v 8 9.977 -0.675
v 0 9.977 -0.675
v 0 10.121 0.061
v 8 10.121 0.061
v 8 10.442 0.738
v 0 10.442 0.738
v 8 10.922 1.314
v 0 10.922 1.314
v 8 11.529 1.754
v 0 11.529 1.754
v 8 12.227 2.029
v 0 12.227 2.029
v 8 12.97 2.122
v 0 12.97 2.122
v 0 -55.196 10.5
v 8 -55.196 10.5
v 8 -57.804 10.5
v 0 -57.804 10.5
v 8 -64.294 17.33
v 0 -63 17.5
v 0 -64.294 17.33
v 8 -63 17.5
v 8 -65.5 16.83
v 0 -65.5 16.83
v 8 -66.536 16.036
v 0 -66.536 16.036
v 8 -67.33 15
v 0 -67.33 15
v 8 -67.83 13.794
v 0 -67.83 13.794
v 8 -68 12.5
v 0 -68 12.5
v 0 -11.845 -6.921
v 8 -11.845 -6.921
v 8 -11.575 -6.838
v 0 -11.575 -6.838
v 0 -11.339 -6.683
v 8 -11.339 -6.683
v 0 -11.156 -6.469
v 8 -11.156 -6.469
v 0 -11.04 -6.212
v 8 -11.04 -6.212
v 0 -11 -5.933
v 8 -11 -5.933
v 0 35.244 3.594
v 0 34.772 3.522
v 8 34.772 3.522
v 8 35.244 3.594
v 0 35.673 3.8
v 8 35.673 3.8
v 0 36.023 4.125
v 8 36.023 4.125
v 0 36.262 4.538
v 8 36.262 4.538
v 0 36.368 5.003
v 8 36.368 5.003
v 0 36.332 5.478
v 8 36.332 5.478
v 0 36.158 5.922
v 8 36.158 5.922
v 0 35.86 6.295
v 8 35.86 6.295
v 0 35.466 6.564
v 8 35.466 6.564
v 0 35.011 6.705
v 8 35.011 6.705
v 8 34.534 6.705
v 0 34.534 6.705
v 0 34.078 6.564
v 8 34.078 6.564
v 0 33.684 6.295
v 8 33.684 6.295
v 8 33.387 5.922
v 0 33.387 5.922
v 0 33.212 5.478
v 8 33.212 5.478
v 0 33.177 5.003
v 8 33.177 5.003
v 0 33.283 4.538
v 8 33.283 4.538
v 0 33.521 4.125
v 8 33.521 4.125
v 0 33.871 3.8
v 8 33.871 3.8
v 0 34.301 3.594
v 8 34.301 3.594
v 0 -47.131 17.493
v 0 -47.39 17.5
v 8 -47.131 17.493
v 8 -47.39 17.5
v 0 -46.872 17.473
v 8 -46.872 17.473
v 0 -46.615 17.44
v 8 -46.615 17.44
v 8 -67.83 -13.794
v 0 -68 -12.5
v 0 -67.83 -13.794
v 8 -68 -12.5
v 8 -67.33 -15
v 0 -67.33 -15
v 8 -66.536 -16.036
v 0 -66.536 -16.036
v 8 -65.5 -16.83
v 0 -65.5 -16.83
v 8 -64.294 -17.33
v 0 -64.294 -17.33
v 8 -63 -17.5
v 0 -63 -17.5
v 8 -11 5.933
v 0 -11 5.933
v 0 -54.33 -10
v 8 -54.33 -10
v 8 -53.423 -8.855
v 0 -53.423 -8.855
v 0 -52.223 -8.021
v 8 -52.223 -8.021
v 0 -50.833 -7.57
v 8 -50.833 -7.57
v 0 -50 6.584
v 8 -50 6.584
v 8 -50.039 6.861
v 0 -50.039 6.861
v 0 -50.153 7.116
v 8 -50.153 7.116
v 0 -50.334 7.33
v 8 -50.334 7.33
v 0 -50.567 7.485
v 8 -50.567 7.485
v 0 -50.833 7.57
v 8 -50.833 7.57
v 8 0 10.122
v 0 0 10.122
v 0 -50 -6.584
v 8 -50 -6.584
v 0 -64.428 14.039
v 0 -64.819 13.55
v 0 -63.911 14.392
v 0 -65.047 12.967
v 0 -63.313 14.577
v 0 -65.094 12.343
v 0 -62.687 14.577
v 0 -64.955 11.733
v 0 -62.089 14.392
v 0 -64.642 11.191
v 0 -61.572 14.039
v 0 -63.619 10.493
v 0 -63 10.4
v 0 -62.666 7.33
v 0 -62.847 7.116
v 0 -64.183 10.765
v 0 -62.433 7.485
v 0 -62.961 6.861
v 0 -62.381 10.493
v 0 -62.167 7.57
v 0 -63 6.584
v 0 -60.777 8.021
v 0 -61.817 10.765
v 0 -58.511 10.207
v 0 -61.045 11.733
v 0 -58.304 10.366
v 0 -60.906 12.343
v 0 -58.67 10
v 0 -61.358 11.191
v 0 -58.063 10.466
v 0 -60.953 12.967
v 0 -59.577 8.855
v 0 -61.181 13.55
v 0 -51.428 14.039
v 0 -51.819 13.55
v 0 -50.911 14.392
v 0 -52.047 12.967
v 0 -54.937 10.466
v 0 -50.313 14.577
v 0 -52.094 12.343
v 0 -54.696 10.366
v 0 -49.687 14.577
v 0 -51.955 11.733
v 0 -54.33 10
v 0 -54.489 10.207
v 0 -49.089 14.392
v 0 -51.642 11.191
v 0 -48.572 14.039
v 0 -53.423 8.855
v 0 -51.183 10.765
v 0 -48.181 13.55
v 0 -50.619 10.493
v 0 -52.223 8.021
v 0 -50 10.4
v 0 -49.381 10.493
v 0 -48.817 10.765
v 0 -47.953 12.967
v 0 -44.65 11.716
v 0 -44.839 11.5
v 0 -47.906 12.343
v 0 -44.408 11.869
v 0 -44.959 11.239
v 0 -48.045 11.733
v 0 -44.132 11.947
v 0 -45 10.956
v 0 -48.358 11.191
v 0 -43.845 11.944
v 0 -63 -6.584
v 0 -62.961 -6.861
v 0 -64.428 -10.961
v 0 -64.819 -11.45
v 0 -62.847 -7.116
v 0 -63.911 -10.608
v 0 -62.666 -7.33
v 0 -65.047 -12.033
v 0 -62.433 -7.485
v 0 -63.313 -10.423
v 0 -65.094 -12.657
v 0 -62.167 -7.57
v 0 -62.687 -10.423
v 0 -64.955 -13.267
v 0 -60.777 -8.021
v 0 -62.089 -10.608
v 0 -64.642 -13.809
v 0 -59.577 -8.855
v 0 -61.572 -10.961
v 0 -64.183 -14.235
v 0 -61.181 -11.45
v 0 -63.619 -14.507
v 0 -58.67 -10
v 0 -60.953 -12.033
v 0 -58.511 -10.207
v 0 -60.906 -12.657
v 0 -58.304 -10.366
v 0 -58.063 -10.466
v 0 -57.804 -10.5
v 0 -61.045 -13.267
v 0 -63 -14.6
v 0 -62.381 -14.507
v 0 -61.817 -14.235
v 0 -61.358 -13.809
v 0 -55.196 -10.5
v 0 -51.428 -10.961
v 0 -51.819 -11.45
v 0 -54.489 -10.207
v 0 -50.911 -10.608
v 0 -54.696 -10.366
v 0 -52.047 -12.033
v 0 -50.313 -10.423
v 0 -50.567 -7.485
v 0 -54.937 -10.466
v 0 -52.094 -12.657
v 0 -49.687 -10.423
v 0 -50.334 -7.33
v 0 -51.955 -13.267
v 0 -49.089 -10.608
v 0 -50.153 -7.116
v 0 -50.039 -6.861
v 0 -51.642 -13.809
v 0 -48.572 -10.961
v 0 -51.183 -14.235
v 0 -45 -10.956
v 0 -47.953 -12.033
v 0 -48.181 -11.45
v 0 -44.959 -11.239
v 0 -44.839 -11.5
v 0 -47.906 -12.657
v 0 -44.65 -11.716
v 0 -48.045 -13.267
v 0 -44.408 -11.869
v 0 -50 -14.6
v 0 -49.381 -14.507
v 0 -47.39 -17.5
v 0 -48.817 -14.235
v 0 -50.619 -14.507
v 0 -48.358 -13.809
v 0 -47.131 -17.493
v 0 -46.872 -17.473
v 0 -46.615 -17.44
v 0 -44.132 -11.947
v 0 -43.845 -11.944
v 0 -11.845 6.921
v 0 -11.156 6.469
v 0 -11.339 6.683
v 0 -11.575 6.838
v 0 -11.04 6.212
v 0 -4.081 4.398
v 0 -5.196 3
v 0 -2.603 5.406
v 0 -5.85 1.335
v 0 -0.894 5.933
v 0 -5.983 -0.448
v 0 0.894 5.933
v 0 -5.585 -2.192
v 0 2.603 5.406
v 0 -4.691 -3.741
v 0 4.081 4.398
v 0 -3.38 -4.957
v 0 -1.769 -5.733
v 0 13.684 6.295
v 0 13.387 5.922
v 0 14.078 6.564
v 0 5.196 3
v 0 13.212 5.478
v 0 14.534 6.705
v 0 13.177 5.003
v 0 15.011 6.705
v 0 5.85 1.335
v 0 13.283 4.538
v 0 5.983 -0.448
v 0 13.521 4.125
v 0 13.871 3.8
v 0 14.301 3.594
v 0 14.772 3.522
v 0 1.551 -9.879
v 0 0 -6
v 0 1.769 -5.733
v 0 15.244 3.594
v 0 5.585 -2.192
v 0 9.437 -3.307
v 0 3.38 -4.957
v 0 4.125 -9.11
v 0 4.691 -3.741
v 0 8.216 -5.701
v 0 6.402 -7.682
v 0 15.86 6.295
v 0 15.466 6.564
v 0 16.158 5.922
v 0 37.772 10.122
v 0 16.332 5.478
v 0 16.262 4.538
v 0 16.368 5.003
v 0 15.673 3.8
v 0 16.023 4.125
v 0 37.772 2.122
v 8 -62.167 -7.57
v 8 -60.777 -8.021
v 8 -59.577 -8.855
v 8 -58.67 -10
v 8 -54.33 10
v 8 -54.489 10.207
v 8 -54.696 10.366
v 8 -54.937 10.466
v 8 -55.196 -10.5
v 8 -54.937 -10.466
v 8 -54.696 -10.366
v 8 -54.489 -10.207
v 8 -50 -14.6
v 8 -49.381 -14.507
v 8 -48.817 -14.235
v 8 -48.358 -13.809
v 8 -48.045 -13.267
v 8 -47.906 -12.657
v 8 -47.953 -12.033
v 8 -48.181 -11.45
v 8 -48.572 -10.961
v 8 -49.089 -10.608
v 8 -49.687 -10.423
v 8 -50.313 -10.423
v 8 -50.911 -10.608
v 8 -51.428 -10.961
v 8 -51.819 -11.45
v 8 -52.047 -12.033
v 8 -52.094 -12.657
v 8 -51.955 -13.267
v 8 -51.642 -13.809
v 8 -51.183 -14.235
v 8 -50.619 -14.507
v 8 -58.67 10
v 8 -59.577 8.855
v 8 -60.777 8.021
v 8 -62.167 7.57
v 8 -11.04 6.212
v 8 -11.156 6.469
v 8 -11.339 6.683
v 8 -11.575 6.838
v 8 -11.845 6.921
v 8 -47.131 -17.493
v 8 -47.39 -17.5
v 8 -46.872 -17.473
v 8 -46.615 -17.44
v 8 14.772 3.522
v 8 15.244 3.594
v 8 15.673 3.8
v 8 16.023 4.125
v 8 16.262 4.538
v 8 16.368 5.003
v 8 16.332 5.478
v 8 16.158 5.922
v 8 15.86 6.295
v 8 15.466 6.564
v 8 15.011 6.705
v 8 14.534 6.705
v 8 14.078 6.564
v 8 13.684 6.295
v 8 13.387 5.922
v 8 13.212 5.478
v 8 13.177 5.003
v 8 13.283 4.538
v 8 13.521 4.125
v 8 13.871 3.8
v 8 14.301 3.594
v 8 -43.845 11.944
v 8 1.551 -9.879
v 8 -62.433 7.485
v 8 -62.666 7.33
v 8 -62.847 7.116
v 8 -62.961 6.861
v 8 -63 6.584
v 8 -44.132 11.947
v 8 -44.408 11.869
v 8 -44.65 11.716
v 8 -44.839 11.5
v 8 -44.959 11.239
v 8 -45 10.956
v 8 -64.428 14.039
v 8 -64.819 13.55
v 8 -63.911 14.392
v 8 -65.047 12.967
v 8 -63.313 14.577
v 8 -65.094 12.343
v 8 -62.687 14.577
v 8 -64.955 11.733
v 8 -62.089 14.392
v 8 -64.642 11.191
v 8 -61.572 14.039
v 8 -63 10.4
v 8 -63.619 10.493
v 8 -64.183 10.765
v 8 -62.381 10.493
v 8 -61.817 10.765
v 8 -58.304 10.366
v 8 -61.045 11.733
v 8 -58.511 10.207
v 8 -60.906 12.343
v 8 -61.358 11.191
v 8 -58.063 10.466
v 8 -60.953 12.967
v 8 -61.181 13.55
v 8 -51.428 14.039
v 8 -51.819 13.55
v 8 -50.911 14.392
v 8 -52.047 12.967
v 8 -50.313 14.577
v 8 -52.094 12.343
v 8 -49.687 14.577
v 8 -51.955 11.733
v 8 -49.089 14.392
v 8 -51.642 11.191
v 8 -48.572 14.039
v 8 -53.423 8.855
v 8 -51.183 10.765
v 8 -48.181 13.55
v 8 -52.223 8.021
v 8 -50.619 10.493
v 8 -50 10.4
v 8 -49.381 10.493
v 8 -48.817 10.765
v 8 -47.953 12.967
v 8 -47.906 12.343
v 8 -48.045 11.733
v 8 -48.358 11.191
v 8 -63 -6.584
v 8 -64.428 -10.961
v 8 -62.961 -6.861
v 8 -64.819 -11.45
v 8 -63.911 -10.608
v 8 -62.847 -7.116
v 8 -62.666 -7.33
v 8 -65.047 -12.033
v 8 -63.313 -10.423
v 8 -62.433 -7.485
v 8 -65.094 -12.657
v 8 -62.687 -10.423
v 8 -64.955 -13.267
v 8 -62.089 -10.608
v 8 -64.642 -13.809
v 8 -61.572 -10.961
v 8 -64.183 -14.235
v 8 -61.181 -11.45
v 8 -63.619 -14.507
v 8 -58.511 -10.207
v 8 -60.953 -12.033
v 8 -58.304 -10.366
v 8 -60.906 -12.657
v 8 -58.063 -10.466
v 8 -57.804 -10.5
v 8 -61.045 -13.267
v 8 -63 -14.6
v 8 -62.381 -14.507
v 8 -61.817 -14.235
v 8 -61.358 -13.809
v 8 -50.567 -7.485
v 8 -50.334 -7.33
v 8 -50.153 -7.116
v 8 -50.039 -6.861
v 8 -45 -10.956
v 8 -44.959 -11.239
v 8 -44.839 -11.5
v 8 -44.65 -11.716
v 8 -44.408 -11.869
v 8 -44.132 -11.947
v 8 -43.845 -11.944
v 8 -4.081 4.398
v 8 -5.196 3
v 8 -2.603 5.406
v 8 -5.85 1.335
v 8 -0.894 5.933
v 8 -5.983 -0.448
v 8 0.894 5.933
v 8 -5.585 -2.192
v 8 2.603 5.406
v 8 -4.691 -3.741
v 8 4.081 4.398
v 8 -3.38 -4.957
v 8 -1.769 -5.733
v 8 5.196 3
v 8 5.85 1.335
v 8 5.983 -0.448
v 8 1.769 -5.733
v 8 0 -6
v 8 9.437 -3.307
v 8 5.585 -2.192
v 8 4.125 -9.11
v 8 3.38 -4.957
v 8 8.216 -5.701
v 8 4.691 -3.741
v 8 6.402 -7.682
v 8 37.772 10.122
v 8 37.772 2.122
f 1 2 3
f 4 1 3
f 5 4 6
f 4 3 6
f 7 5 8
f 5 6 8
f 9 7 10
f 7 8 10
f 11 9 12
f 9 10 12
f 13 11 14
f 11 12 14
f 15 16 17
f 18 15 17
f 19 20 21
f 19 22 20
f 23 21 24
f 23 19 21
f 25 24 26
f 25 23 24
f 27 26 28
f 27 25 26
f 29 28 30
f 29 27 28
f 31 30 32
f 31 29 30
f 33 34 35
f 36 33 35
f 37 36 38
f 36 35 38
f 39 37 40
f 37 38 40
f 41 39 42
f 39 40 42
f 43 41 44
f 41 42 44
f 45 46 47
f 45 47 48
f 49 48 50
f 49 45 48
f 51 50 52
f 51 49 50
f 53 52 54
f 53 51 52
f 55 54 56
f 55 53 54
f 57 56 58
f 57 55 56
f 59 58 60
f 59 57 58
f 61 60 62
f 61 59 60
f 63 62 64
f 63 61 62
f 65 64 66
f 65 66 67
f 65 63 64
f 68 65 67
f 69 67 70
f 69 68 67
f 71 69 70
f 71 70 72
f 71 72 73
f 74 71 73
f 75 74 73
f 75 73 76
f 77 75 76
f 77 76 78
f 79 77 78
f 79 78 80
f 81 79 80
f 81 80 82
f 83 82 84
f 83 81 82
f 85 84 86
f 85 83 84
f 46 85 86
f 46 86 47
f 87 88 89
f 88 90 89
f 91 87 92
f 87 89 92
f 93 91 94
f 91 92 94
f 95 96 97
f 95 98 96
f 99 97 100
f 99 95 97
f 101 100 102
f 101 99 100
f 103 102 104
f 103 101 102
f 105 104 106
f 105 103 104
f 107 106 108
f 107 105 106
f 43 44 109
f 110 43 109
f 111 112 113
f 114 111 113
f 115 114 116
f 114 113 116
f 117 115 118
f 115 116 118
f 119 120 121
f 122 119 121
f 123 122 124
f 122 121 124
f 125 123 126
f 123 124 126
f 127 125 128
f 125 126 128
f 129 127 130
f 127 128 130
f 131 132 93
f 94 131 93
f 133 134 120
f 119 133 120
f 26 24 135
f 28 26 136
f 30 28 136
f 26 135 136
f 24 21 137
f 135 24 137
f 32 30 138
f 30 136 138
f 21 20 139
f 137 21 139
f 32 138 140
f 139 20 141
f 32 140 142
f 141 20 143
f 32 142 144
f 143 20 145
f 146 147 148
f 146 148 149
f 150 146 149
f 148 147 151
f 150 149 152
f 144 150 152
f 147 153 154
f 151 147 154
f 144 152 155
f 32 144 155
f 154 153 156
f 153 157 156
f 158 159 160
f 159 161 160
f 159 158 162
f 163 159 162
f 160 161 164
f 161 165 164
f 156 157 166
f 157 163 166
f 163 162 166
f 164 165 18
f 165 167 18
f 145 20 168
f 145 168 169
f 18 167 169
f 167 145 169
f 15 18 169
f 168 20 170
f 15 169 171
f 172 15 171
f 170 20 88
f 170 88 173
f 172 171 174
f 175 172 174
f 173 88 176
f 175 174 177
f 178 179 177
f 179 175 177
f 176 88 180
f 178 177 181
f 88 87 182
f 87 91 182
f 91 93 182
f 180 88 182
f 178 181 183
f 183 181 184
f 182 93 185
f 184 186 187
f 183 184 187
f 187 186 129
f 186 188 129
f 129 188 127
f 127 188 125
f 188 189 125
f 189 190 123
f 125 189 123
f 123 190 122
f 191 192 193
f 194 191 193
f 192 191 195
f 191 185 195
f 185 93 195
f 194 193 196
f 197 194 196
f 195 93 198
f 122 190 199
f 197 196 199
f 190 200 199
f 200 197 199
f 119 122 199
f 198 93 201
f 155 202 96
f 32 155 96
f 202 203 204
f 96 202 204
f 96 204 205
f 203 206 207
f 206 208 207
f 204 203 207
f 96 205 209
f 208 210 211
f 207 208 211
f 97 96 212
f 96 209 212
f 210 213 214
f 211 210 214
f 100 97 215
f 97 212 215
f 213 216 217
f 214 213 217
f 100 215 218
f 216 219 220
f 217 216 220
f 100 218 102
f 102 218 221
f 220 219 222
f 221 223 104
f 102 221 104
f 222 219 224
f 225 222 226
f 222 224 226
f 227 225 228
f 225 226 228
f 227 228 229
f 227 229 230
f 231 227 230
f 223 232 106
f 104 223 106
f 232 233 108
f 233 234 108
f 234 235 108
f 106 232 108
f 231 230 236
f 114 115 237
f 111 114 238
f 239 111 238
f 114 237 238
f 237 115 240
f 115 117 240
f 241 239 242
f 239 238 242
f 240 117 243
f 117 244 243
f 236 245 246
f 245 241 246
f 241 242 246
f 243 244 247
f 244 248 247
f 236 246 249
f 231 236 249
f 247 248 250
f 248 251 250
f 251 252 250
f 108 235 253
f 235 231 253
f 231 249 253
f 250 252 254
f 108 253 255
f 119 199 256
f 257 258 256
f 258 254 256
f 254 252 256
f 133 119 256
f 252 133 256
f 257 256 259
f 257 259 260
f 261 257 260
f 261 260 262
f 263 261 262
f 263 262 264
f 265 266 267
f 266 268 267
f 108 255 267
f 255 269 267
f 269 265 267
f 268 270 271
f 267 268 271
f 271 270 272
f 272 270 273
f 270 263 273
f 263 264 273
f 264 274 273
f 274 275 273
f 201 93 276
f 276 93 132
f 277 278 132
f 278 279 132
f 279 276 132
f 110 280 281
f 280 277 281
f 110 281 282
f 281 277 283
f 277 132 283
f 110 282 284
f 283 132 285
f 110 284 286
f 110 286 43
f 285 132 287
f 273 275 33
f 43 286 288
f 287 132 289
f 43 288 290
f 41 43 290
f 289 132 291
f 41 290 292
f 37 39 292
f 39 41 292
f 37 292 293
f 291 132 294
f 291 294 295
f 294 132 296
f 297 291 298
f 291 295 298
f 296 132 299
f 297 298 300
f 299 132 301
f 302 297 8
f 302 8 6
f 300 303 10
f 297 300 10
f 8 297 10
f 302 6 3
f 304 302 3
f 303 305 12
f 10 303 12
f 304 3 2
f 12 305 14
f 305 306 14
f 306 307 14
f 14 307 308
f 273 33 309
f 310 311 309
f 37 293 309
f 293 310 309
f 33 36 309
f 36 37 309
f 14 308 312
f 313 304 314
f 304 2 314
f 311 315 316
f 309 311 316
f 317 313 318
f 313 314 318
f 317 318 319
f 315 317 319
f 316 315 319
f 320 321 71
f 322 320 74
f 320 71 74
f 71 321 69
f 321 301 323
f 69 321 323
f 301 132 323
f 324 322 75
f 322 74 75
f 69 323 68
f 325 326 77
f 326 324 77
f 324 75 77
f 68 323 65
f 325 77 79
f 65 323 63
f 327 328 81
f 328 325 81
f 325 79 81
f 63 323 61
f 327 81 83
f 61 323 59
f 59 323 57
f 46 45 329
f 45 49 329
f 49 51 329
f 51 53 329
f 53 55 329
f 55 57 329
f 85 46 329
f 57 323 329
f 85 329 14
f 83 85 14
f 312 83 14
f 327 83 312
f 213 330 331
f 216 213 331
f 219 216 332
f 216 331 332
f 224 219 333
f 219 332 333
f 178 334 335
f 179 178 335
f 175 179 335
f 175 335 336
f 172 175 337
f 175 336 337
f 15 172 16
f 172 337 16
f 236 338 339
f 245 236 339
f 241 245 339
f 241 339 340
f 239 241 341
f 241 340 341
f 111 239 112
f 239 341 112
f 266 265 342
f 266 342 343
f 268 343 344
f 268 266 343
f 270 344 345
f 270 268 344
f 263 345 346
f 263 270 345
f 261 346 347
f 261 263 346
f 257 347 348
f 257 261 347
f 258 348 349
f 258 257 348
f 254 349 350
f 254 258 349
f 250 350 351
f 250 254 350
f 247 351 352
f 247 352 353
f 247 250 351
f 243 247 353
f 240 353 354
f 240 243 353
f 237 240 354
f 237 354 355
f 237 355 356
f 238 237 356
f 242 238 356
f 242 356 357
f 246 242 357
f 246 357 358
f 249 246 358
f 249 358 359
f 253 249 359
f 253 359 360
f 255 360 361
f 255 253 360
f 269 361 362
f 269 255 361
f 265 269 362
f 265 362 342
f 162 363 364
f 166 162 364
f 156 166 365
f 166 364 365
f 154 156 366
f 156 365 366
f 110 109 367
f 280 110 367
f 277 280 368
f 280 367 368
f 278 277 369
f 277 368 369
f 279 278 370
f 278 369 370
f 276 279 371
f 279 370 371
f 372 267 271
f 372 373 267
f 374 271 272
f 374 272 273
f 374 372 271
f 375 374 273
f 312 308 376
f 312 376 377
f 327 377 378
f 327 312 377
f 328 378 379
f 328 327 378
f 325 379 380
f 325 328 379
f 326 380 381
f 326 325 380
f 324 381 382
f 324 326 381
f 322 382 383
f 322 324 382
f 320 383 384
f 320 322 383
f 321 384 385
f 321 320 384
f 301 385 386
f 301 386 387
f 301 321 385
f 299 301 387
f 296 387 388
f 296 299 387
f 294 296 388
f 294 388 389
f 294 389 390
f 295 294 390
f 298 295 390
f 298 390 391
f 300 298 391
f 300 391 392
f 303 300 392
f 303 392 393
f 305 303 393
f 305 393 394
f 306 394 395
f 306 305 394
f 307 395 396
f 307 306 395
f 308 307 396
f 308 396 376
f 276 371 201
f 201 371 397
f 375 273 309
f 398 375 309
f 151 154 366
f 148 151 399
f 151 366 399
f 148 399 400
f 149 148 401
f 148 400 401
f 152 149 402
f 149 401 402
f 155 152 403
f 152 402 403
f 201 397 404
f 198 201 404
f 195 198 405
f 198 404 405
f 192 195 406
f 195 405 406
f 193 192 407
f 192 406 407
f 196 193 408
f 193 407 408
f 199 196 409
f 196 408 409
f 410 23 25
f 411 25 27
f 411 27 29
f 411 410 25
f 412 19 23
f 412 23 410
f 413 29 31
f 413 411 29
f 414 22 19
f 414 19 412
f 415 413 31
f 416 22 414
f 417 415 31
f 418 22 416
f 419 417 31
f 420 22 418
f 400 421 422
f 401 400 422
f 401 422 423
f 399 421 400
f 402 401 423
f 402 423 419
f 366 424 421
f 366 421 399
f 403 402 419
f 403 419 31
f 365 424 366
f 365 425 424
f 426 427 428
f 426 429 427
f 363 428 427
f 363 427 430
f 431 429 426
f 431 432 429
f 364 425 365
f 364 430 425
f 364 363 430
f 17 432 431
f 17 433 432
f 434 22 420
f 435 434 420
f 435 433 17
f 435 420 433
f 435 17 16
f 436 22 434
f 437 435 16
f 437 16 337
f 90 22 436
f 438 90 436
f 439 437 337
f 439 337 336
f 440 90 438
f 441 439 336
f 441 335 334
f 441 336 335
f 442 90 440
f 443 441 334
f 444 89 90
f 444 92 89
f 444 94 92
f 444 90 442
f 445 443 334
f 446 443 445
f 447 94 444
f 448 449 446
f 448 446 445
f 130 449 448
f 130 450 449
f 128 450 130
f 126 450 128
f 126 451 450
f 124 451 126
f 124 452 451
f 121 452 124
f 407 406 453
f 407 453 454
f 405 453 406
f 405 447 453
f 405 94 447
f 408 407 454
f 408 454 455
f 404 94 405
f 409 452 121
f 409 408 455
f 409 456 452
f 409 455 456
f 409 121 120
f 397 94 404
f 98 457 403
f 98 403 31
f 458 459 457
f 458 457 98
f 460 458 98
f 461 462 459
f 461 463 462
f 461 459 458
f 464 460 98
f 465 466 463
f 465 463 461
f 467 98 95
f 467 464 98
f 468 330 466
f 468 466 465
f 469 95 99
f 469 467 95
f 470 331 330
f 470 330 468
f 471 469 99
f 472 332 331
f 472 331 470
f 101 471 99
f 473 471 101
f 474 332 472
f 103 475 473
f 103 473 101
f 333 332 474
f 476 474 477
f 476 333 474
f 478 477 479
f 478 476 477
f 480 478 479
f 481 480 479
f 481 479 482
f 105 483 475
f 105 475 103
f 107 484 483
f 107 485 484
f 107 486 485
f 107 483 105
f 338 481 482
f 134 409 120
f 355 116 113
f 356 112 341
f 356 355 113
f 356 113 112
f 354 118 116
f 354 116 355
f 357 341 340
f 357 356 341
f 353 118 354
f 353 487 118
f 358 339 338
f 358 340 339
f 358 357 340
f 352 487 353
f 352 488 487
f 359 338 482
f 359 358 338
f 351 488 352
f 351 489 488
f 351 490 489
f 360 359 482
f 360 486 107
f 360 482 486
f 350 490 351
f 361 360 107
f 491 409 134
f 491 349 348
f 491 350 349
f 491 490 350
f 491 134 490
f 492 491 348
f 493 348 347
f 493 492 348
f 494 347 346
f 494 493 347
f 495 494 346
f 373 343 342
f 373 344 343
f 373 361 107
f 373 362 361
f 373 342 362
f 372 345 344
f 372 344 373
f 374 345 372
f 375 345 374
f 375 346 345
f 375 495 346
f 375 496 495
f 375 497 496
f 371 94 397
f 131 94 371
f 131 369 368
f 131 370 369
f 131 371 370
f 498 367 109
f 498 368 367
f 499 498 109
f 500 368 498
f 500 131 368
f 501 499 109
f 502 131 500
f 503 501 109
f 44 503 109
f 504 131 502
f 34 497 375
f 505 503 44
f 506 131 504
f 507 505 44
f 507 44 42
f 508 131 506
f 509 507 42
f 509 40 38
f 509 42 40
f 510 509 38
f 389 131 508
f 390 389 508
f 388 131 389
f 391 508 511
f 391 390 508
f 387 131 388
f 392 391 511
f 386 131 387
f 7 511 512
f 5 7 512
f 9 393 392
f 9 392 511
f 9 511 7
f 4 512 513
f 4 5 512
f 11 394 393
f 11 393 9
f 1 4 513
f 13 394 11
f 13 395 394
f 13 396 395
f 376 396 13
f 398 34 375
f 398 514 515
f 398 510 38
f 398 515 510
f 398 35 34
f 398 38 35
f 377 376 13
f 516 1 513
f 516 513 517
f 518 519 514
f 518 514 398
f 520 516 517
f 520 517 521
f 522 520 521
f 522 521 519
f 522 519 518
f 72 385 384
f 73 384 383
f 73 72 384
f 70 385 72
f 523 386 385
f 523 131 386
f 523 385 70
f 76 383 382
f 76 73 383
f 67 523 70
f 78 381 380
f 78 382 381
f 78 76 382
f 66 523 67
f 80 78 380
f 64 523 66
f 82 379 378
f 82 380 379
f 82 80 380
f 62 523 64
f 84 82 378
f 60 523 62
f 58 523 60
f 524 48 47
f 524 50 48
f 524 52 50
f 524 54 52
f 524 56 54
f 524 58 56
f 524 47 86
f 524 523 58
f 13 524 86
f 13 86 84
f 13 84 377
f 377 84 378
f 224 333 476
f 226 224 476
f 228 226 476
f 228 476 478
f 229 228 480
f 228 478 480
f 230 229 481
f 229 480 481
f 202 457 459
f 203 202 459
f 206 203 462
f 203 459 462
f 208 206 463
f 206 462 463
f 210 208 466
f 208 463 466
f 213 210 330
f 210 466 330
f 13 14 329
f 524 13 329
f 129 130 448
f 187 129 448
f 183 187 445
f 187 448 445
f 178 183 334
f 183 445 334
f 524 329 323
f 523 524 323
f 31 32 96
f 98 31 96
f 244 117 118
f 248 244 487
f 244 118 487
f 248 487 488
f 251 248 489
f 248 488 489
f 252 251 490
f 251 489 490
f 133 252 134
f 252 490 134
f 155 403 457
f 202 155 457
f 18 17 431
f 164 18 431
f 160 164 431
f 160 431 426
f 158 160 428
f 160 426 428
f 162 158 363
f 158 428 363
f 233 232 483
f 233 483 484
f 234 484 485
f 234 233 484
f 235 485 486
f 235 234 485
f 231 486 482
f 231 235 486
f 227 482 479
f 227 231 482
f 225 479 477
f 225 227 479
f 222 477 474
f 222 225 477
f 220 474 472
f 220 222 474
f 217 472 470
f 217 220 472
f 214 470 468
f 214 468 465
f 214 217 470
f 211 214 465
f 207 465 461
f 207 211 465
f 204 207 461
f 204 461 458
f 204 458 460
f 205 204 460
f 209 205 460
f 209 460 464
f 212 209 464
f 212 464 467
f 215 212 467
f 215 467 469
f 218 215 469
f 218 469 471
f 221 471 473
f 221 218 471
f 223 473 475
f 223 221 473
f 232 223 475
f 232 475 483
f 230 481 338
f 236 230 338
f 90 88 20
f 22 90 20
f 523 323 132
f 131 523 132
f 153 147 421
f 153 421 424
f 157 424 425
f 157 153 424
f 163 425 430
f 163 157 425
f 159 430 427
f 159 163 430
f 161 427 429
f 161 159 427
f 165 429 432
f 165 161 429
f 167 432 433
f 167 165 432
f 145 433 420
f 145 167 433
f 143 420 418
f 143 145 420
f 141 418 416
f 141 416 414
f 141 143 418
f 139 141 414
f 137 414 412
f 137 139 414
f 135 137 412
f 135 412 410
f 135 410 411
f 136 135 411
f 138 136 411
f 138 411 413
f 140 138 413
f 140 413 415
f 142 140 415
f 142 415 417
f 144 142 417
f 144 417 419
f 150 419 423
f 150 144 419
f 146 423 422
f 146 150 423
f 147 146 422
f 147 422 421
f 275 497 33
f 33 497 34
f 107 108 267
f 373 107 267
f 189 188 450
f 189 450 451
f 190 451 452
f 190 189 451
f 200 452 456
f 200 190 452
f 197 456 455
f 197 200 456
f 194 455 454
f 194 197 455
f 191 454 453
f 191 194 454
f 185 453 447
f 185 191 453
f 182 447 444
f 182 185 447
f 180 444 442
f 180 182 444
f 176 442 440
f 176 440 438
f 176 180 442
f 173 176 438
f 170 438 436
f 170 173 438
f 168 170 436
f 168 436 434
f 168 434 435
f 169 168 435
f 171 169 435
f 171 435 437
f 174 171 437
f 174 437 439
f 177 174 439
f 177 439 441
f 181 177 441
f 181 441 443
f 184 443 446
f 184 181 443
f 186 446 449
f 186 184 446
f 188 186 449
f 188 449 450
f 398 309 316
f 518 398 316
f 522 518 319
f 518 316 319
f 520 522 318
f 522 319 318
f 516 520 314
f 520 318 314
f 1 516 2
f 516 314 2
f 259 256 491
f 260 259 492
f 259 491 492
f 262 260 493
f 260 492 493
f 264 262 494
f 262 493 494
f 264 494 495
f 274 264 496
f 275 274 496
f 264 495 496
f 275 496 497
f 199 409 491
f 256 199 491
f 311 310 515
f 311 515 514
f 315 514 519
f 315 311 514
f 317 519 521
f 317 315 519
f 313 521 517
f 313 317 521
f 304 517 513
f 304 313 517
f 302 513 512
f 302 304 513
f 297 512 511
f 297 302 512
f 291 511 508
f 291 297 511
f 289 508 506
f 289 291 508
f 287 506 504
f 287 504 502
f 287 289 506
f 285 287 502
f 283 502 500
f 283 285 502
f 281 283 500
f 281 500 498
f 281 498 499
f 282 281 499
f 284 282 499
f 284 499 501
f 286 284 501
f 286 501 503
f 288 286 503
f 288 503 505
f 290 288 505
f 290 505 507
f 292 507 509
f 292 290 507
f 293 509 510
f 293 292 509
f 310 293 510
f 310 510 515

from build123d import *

# Parameters (mm, degrees)
SKETCH_1_R          = 6
SKETCH_1_R_2        = 2.1
SKETCH_1_R_3        = 1.6
EXTRUDE_1_DEPTH     = 8
CUT_EXTRUDE_2_DEPTH = 71.670007783
FILLET_1_R          = 5


with BuildPart() as part:
    # 草图1 → 凸台-拉伸1 (new body)
    with BuildSketch(Plane(origin=(0, 0, 0), x_dir=(0, 0, -1), z_dir=(1, 0, 0))):
        with BuildLine():
            Line((-17.5, -47), (-17.5, -68))
            Line((-17.5, -68), (17.5, -68))
            Line((17.5, -68), (17.5, -47))
            Line((17.5, -47), (9.879034185, 1.550704218))
            ThreePointArc((9.879034185, 1.550704218), (6.75266911, 7.375734533), (0.675040765, 9.977189983))
            ThreePointArc((0.675040765, 9.977189983), (-1.314197069, 10.921876413), (-2.122447005, 12.970346978))
            Line((-2.122447005, 12.970346978), (-2.122447005, 37.772165508))
            Line((-2.122447005, 37.772165508), (-10.122447005, 37.772165508))
            Line((-10.122447005, 37.772165508), (-10.122447005, 0))
            Line((-10.122447005, 0), (-17.5, -47))
        make_face()
        Circle(SKETCH_1_R, mode=Mode.SUBTRACT)
        with Locations((-12.5, -50)):
            Circle(SKETCH_1_R_2, mode=Mode.SUBTRACT)
        with Locations((12.5, -50)):
            Circle(SKETCH_1_R_2, mode=Mode.SUBTRACT)
        with Locations((-12.5, -63)):
            Circle(SKETCH_1_R_2, mode=Mode.SUBTRACT)
        with Locations((12.5, -63)):
            Circle(SKETCH_1_R_2, mode=Mode.SUBTRACT)
        with Locations((-5.122447005, 34.772165508)):
            Circle(SKETCH_1_R_3, mode=Mode.SUBTRACT)
        with Locations((-5.122447005, 14.772165508)):
            Circle(SKETCH_1_R_3, mode=Mode.SUBTRACT)
    extrude(amount=EXTRUDE_1_DEPTH)

    # 草图3 → 切除-拉伸2 (cut, through all)
    with BuildSketch(Plane(origin=(8, 0, 0), x_dir=(0, 0, -1), z_dir=(1, 0, 0))):
        with BuildLine():
            Line((-6.920512772, -11.844929578), (-11.943527577, -43.844929578))
            ThreePointArc((-11.943527577, -43.844929578), (-11.715581533, -44.649972914), (-10.955624159, -45))
            Line((-10.955624159, -45), (10.955624159, -45))
            ThreePointArc((10.955624159, -45), (11.715581533, -44.649972914), (11.943527577, -43.844929578))
            Line((11.943527577, -43.844929578), (6.920512772, -11.844929578))
            ThreePointArc((6.920512772, -11.844929578), (6.582582268, -11.240042626), (5.932609354, -11))
            Line((5.932609354, -11), (-5.932609354, -11))
            ThreePointArc((-5.932609354, -11), (-6.582582268, -11.240042626), (-6.920512772, -11.844929578))
        make_face()
        with BuildLine():
            Line((-10.5, -55.196152423), (-10.5, -57.803847577))
            ThreePointArc((-10.5, -57.803847577), (-10.366025404, -58.303847577), (-10, -58.669872981))
            ThreePointArc((-10, -58.669872981), (-8.394106246, -60.146644697), (-7.569933514, -62.166666667))
            ThreePointArc((-7.569933514, -62.166666667), (-7.229417441, -62.763762616), (-6.583920217, -63))
            Line((-6.583920217, -63), (6.583920217, -63))
            ThreePointArc((6.583920217, -63), (7.229417441, -62.763762616), (7.569933514, -62.166666667))
            ThreePointArc((7.569933514, -62.166666667), (8.394106246, -60.146644697), (10, -58.669872981))
            ThreePointArc((10, -58.669872981), (10.366025404, -58.303847577), (10.5, -57.803847577))
            Line((10.5, -57.803847577), (10.5, -55.196152423))
            ThreePointArc((10.5, -55.196152423), (10.366025404, -54.696152423), (10, -54.330127019))
            ThreePointArc((10, -54.330127019), (8.394106246, -52.853355303), (7.569933514, -50.833333333))
            ThreePointArc((7.569933514, -50.833333333), (7.229417441, -50.236237384), (6.583920217, -50))
            Line((6.583920217, -50), (-6.583920217, -50))
            ThreePointArc((-6.583920217, -50), (-7.229417441, -50.236237384), (-7.569933514, -50.833333333))
            ThreePointArc((-7.569933514, -50.833333333), (-8.394106246, -52.853355303), (-10, -54.330127019))
            ThreePointArc((-10, -54.330127019), (-10.366025404, -54.696152423), (-10.5, -55.196152423))
        make_face()
    extrude(amount=-CUT_EXTRUDE_2_DEPTH, mode=Mode.SUBTRACT)

    # 圆角1
    fillet_1_edges = [part.edges().sort_by_distance(p)[0] for p in [
        (4, -47, -17.5),
        (4, -68, -17.5),
        (4, -68, 17.5),
        (4, -47, 17.5),
    ]]
    fillet(fillet_1_edges, radius=FILLET_1_R)


solid = part.part
